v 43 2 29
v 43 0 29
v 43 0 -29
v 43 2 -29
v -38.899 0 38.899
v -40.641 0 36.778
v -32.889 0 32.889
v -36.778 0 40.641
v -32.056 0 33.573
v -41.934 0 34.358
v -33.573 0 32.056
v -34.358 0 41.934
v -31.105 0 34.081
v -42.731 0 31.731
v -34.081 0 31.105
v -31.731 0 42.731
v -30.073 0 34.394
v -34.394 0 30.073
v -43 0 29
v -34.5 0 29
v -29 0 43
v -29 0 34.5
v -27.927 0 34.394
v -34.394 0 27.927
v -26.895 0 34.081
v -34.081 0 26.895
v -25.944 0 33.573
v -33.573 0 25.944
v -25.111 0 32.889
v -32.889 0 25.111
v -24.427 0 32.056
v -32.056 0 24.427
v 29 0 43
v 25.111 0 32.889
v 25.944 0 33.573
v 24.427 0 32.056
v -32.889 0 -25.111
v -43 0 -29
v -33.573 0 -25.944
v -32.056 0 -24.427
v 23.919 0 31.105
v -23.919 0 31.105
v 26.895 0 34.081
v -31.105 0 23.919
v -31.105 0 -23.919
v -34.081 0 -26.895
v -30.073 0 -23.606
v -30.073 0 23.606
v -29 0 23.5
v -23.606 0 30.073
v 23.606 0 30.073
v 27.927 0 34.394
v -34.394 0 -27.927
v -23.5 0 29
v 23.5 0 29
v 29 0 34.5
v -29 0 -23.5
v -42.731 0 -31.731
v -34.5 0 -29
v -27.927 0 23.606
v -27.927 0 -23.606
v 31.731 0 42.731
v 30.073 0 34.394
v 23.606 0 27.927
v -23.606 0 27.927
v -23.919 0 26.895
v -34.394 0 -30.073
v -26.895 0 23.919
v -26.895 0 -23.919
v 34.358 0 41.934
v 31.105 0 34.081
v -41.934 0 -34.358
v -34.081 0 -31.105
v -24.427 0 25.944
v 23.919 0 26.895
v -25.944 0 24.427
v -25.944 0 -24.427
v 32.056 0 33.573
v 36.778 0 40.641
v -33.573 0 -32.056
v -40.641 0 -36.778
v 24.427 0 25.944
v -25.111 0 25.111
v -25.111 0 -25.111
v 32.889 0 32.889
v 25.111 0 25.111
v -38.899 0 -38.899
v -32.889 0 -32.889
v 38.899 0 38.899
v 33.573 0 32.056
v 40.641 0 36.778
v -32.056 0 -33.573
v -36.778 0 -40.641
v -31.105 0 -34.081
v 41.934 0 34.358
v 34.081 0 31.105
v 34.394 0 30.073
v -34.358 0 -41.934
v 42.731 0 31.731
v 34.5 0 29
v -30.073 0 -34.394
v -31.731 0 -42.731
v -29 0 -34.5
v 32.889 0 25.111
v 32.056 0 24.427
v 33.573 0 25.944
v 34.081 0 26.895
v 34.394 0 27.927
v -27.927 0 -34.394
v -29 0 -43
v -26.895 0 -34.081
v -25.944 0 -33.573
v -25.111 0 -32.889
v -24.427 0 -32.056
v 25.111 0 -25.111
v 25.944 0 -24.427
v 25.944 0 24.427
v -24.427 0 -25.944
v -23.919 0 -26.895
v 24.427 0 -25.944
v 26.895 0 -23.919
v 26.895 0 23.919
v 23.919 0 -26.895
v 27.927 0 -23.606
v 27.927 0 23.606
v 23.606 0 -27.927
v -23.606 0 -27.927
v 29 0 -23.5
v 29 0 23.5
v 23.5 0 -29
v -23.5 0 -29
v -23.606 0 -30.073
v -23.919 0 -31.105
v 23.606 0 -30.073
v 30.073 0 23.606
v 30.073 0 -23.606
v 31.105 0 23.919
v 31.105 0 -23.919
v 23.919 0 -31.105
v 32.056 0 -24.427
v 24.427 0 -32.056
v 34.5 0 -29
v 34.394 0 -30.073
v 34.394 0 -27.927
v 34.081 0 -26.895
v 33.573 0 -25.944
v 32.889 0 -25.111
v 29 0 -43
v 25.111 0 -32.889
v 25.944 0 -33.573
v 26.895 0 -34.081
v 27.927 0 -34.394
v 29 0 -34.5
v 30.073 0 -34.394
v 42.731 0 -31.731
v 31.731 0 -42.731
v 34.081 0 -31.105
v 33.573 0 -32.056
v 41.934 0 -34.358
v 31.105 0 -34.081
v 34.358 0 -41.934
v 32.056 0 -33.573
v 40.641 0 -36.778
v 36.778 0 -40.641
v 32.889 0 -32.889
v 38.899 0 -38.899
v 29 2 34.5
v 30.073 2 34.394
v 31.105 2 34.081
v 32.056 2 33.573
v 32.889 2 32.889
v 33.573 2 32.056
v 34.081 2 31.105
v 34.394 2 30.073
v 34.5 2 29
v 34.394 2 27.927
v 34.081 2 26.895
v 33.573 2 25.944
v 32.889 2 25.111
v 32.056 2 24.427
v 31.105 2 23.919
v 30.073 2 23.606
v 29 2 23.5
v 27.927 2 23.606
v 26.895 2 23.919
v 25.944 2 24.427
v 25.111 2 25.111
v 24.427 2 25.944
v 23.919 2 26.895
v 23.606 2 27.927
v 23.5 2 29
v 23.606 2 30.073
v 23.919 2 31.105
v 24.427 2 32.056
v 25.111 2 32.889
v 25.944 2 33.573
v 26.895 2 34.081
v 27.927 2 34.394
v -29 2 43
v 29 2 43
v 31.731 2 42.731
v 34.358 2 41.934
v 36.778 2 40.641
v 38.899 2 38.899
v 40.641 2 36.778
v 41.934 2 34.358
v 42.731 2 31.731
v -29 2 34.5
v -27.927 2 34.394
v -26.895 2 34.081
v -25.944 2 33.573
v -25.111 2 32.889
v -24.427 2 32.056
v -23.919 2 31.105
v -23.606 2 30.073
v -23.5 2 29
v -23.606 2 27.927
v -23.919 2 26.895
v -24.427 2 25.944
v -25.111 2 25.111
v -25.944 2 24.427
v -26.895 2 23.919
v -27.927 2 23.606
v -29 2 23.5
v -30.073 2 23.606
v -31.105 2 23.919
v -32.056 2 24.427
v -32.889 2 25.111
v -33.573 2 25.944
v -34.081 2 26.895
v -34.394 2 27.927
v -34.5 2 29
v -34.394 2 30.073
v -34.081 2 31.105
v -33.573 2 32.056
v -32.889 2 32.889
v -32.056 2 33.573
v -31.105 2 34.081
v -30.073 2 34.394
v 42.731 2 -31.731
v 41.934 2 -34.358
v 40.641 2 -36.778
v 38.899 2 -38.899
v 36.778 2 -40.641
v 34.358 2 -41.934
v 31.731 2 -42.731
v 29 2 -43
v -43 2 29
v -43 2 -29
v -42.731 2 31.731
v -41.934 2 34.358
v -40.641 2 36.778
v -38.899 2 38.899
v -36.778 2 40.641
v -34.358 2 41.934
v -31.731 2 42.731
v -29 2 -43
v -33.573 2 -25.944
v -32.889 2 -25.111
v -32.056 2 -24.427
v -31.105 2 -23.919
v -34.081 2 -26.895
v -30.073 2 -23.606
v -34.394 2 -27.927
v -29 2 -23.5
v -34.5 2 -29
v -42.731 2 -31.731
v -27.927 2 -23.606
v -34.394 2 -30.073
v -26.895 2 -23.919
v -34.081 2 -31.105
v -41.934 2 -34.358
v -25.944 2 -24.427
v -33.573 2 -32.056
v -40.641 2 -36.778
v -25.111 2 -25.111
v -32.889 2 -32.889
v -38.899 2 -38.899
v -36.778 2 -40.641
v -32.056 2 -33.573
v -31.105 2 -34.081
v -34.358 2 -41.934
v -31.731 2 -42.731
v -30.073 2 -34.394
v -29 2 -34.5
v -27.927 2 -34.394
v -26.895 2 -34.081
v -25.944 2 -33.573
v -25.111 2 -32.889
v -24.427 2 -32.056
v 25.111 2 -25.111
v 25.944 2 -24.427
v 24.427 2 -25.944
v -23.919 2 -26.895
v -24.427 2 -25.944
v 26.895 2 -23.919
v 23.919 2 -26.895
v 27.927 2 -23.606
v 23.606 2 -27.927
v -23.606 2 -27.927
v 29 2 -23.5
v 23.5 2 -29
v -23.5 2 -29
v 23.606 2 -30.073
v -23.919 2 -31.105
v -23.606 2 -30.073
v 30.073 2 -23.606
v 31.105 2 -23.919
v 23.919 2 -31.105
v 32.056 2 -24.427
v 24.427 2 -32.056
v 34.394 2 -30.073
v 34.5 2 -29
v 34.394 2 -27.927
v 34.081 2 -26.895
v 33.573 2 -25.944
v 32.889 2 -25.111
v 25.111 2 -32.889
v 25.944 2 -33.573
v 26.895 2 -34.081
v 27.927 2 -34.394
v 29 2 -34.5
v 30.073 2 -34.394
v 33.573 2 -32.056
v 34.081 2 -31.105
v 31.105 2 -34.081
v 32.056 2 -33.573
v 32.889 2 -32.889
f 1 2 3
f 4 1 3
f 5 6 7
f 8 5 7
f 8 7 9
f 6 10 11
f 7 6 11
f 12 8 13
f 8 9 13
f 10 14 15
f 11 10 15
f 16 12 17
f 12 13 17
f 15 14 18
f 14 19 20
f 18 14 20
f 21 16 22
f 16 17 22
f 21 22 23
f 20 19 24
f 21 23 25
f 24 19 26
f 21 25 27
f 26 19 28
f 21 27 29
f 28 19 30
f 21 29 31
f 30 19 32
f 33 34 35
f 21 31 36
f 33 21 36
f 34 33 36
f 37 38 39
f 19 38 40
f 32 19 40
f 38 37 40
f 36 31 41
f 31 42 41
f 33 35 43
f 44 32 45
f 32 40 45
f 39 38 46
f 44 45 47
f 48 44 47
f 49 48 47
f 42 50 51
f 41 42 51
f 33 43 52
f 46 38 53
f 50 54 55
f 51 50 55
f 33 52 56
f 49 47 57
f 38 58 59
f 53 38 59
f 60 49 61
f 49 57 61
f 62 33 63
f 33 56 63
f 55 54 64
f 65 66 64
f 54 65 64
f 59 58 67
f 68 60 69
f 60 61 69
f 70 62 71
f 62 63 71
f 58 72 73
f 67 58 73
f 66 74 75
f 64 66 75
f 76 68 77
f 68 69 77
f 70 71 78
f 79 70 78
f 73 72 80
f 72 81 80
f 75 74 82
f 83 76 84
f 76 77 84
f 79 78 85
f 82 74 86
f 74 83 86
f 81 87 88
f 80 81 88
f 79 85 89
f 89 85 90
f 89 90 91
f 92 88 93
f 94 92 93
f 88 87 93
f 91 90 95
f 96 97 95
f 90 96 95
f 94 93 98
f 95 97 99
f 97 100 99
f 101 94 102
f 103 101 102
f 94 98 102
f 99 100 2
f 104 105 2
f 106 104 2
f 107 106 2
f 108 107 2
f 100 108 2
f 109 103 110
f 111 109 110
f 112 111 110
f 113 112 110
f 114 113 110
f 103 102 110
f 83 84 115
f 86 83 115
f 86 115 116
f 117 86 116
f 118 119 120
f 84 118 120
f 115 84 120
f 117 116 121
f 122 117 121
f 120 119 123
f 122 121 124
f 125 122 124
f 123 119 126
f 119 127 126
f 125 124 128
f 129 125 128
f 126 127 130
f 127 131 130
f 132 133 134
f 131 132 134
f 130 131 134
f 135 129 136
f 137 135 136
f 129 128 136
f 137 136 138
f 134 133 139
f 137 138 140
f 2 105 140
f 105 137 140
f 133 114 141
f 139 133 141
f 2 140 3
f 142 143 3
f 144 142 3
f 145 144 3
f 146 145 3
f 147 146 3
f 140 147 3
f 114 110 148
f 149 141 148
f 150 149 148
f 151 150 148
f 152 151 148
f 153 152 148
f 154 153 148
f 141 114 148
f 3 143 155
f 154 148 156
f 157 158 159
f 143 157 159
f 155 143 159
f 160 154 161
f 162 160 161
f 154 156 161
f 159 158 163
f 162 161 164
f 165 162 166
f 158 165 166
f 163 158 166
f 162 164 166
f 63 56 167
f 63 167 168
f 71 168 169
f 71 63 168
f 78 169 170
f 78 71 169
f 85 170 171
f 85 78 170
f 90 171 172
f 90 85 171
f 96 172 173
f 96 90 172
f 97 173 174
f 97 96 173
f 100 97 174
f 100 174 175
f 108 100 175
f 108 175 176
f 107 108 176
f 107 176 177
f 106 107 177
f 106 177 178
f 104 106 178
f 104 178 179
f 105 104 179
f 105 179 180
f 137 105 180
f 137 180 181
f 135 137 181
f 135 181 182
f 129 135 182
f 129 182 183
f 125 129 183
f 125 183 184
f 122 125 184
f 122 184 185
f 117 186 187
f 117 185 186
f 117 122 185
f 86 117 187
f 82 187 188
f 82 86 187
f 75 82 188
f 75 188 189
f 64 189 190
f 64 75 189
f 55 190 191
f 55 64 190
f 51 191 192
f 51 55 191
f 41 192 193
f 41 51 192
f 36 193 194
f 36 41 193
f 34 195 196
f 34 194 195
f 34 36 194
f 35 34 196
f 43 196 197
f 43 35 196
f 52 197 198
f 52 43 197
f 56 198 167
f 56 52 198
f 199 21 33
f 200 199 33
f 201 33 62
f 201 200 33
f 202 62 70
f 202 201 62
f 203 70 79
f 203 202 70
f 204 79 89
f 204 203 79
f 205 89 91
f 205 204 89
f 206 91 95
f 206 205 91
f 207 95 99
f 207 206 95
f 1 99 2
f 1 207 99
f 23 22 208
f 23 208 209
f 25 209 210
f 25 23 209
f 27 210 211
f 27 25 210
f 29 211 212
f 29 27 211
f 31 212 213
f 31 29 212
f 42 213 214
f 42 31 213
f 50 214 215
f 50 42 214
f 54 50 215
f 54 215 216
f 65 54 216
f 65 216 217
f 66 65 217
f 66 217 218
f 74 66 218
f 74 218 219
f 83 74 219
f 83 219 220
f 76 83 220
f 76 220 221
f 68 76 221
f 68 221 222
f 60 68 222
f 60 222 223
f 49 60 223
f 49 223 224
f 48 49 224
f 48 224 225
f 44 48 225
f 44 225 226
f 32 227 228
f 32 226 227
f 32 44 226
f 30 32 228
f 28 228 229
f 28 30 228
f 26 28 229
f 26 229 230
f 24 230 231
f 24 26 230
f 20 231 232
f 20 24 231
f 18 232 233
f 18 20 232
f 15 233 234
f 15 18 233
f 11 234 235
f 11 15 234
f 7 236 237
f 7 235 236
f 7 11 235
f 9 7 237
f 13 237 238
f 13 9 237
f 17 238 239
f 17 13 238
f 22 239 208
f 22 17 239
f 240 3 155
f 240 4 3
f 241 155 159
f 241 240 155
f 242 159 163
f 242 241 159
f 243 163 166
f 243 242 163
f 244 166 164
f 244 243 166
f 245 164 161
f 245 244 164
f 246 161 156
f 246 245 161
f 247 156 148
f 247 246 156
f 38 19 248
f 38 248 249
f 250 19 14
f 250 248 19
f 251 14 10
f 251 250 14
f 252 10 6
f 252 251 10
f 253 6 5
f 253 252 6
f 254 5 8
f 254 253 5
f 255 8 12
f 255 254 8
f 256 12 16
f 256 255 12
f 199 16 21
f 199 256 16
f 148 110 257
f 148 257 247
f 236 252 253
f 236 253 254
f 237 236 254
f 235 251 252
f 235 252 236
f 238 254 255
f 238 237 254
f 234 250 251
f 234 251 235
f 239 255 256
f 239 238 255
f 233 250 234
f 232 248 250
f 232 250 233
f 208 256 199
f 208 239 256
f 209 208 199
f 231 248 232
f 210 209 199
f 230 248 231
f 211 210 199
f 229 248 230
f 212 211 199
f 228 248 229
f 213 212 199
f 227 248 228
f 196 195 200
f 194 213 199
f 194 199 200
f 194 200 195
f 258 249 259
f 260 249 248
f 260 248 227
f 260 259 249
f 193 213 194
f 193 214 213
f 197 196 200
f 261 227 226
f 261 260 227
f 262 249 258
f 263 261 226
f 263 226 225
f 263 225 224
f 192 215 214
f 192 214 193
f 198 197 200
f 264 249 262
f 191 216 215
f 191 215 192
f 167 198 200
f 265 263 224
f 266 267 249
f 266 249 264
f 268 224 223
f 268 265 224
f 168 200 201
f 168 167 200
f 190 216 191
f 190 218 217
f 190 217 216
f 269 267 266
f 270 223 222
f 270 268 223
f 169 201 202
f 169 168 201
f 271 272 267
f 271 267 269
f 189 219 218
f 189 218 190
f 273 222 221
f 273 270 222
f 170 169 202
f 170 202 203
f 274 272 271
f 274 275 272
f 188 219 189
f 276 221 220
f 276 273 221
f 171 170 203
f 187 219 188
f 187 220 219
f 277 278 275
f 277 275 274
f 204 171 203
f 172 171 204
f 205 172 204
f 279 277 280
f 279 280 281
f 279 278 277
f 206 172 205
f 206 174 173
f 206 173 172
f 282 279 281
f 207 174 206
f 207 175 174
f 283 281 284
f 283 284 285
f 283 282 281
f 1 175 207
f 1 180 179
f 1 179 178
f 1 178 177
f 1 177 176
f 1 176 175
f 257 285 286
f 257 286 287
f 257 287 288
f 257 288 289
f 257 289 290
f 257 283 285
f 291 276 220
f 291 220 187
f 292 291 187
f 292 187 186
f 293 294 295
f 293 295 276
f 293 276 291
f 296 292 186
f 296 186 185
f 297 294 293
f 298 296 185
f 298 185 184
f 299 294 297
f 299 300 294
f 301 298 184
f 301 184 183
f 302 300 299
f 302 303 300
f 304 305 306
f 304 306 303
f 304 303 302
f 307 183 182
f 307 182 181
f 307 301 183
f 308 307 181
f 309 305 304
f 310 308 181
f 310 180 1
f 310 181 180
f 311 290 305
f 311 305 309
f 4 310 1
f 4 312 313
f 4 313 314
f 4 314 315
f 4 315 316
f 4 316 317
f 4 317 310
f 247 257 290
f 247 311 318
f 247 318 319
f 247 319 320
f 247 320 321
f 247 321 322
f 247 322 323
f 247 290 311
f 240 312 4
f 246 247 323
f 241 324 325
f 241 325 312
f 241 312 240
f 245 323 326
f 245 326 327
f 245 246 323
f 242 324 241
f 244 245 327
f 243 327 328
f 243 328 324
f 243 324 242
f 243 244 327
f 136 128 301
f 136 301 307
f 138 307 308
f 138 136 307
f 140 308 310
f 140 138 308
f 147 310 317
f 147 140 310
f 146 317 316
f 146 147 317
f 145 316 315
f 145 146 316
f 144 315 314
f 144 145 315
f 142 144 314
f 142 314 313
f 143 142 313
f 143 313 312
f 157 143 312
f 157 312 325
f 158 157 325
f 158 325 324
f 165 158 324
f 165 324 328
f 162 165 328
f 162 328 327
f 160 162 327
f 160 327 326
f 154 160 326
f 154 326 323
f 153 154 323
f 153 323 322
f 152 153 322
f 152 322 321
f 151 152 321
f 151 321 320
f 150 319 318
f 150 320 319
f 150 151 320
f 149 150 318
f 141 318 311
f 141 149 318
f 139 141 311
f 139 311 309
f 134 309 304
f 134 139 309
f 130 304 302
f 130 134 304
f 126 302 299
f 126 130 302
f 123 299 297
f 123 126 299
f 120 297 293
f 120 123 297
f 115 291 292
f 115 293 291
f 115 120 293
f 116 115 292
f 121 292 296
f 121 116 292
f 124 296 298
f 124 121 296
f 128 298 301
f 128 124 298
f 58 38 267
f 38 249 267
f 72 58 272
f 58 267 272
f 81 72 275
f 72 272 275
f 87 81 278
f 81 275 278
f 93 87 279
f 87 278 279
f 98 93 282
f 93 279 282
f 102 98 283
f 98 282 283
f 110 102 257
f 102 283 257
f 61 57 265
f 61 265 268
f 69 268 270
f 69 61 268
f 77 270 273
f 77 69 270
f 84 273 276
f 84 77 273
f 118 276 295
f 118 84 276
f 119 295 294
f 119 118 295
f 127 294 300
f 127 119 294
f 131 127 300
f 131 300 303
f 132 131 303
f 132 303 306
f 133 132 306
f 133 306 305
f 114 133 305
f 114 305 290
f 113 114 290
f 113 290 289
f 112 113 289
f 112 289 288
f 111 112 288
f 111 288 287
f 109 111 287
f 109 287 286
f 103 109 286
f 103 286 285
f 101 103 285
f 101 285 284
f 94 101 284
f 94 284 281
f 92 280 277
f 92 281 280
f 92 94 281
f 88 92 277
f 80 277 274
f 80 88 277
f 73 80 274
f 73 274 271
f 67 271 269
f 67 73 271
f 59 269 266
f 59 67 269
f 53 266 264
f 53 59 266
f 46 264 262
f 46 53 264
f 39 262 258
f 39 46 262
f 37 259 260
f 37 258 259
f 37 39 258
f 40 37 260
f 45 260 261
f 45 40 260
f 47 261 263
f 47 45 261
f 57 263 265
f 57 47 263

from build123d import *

# Parameters (mm, degrees)
SKETCH_1_W               = 86
SKETCH_1_H               = 86
EXTRUDE_1_DEPTH          = 2
FILLET_3_R               = 14
CUT_EXTRUDE_1_DEPTH      = 61.844062981
CUT_EXTRUDE_1_DEPTH_BACK = 61.844062981
SKETCH_2_R               = 5.5


with BuildPart() as part:
    # 草图1 → 凸台-拉伸1 (new body)
    with BuildSketch(Plane(origin=(0, 0, 0), x_dir=(1, 0, 0), z_dir=(0, 1, 0))):
        Rectangle(SKETCH_1_W, SKETCH_1_H)
    extrude(amount=EXTRUDE_1_DEPTH)

    # 圆角3
    fillet_3_edges = [part.edges().sort_by_distance(p)[0] for p in [
        (43, 1, 43),
        (-43, 1, 43),
        (-43, 1, -43),
        (43, 1, -43),
    ]]
    fillet(fillet_3_edges, radius=FILLET_3_R)

    # 草图2 → 切除-拉伸1 (cut, two sides: drawn at the far end of the back side and taken through both)
    with BuildSketch(Plane(origin=(0, 2, 0), x_dir=(1, 0, 0), z_dir=(0, 1, 0)).offset(-CUT_EXTRUDE_1_DEPTH_BACK)):
        with Locations(Location((-29, 29, 0), (0, 0, 270))):
            Circle(SKETCH_2_R)
        with Locations(Location((-29, -29, 0), (0, 0, 270))):
            Circle(SKETCH_2_R)
        with Locations(Location((29, -29, 0), (0, 0, 270))):
            Circle(SKETCH_2_R)
        with Locations(Location((29, 29, 0), (0, 0, 270))):
            Circle(SKETCH_2_R)
    extrude(amount=CUT_EXTRUDE_1_DEPTH + CUT_EXTRUDE_1_DEPTH_BACK, mode=Mode.SUBTRACT)


solid = part.part
